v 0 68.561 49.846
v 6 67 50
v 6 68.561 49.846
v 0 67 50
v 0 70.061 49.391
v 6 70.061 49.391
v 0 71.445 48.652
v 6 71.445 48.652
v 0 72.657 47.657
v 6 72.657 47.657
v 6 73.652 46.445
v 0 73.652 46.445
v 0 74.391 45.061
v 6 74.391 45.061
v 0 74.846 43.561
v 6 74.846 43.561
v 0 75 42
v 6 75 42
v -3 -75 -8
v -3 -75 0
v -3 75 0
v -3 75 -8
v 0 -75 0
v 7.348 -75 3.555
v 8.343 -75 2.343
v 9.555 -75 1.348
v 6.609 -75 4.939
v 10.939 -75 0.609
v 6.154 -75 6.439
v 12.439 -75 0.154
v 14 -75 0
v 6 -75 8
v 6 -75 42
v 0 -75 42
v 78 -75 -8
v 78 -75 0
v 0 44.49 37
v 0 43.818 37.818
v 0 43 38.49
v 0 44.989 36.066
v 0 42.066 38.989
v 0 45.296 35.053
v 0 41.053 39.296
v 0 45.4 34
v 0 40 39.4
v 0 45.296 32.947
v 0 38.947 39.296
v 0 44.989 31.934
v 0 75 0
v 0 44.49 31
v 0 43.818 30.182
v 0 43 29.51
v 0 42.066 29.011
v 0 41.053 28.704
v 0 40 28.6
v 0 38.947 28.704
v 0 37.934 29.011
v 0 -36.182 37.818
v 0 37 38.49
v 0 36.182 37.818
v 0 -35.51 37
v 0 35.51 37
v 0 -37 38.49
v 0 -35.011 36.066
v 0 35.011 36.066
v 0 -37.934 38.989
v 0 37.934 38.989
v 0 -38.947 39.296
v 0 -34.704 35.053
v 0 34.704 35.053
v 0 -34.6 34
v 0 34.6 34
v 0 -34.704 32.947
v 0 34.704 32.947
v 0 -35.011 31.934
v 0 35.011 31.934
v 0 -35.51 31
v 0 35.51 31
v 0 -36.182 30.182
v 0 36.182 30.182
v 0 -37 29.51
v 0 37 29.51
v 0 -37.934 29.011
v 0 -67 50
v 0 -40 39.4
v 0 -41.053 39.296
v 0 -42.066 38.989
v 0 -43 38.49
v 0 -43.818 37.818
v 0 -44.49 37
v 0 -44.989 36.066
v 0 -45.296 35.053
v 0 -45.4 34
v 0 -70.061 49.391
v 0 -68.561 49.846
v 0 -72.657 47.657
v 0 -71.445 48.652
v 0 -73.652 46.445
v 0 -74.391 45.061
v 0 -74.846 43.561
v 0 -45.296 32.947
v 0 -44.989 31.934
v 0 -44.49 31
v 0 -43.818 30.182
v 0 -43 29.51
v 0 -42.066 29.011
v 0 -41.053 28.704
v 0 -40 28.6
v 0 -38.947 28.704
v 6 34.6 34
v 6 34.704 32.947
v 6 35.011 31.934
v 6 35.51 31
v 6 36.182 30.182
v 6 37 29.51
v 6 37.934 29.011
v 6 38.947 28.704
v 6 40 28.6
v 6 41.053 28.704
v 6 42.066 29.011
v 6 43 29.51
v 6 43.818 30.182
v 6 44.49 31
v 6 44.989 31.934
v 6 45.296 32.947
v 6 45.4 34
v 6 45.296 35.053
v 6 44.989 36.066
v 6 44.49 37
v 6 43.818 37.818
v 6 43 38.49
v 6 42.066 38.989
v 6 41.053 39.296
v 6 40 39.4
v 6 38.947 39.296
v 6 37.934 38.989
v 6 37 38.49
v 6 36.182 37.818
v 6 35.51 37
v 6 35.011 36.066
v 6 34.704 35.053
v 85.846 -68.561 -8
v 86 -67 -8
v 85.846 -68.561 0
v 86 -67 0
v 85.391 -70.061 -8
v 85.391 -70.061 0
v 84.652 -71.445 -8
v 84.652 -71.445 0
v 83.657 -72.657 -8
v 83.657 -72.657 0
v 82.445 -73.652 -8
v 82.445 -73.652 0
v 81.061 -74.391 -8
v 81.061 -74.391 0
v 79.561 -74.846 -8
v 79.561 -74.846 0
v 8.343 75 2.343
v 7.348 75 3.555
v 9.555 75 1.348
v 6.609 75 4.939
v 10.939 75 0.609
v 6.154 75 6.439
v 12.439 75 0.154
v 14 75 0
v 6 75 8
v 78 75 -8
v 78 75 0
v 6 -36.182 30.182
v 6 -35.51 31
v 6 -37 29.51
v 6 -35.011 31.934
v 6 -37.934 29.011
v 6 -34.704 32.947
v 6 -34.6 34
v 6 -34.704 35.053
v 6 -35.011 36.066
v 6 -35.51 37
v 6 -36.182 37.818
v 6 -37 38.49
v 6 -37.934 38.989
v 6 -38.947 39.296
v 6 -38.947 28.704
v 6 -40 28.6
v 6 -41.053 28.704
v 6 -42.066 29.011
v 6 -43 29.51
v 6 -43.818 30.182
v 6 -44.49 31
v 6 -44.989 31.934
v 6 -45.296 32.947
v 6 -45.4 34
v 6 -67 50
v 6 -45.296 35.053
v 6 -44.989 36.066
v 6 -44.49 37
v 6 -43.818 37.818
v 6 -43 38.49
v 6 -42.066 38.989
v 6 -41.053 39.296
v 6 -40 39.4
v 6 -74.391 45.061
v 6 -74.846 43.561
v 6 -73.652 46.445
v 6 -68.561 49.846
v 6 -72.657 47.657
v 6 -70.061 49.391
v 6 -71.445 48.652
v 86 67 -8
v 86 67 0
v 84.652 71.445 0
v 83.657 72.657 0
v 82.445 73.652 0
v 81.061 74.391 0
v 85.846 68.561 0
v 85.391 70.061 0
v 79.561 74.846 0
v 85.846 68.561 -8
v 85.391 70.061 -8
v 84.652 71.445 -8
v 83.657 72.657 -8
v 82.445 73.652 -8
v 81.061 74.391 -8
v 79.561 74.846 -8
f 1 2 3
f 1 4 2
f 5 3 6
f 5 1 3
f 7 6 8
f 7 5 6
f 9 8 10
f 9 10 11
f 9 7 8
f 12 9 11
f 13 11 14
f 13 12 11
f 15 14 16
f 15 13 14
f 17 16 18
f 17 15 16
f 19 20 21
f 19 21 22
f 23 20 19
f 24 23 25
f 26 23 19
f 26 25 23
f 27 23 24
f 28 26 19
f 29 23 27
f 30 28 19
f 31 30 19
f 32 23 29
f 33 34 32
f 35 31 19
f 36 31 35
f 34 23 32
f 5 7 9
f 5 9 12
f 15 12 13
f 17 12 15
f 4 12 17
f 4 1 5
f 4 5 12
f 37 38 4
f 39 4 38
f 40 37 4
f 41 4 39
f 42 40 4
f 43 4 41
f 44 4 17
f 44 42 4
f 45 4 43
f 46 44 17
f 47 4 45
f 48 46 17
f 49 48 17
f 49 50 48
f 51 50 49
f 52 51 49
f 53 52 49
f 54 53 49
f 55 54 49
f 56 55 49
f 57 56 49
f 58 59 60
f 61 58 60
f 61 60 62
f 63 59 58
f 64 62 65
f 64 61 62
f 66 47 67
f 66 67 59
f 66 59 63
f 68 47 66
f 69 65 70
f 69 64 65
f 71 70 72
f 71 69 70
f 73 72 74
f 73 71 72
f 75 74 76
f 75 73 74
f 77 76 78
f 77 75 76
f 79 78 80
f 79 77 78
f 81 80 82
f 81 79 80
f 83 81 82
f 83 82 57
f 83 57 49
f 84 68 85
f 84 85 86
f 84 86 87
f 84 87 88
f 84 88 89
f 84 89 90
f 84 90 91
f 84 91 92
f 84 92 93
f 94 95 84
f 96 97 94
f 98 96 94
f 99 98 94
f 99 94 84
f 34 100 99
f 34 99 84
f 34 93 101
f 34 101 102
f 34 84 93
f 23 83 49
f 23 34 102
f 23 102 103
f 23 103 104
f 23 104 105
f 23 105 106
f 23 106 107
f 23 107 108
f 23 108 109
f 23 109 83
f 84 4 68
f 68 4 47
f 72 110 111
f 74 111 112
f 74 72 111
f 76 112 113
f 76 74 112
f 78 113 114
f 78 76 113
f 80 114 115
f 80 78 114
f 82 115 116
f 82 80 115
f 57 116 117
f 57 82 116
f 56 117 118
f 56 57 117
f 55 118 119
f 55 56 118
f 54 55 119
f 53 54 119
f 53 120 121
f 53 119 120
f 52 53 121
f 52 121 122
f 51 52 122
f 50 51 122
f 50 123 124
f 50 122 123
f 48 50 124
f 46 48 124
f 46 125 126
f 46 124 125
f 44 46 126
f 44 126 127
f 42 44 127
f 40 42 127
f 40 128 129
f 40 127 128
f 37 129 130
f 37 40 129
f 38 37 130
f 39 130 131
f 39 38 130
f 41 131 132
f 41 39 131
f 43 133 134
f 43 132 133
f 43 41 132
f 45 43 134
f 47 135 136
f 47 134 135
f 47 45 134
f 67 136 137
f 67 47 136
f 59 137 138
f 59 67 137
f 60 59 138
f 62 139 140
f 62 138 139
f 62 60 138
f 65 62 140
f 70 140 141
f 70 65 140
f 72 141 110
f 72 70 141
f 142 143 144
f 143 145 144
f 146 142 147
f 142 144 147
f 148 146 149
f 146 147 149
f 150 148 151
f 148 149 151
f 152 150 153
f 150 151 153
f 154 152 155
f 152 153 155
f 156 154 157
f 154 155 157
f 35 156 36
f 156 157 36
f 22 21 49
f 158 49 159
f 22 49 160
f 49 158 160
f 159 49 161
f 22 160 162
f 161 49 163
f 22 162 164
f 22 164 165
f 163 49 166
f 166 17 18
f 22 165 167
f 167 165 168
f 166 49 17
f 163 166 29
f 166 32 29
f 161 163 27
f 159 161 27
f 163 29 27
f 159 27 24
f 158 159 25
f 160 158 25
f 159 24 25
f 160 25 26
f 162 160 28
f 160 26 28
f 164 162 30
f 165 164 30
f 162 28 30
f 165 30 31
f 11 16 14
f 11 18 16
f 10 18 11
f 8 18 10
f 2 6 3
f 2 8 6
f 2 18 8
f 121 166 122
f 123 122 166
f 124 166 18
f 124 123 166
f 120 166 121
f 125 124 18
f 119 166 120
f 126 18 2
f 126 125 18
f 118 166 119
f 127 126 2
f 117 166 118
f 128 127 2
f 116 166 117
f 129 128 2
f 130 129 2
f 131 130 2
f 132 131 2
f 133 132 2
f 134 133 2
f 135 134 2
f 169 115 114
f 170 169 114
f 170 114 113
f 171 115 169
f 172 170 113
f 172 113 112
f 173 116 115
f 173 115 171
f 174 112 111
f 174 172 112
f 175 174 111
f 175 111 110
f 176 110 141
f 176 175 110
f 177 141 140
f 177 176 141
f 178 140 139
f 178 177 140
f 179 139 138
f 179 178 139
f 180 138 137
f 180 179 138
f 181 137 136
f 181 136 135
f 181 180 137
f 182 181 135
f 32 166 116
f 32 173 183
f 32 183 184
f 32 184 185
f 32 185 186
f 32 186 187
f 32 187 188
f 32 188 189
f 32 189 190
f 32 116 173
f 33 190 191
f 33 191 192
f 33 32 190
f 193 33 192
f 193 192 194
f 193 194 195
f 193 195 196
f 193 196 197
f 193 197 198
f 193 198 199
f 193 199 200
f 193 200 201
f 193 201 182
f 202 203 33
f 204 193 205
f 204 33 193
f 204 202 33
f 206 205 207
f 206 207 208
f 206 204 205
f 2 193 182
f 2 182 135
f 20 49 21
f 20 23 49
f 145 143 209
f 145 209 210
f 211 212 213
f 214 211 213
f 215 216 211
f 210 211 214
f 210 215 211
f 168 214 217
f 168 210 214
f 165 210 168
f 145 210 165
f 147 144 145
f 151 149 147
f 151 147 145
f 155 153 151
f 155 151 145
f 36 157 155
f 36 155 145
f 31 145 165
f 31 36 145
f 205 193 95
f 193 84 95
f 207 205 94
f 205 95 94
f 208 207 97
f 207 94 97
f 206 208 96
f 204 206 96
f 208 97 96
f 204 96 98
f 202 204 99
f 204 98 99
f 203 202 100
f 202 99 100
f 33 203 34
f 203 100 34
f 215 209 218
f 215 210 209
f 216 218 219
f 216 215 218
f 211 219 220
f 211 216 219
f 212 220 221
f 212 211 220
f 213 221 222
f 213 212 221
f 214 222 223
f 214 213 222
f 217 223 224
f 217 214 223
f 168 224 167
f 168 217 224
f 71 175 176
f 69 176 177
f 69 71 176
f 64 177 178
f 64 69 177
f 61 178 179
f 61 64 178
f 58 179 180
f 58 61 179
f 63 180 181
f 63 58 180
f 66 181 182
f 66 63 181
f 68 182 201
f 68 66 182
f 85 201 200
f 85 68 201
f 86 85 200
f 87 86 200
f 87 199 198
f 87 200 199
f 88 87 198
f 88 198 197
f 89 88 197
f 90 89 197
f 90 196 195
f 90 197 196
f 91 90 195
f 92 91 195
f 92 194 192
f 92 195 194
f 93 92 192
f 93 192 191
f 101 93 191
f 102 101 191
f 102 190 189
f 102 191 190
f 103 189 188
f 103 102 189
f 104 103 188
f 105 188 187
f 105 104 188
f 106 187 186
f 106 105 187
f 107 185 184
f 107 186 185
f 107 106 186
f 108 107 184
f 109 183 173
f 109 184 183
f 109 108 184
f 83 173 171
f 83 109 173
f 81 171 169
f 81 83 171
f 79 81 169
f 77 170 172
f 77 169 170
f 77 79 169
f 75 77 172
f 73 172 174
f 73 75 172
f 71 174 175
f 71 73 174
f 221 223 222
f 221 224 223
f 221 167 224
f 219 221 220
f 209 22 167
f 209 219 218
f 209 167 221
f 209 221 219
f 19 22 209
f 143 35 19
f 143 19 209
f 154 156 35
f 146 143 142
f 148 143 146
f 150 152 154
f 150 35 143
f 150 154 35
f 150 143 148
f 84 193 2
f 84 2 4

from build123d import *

# Parameters (mm, degrees)
F1_DEPTH = 75
F2_R     = 8
F3_R     = 5.4
F4_DEPTH = 25


with BuildPart() as f1:
    # F0 (on Front) → F1 (new body, symmetric)
    with BuildSketch(Plane.XZ):
        Polygon((0, 0), (-3, 0), (-3, -8), (86, -8), (86, 0), (6, 0), (6, 50), (0, 50), align=None)
    extrude(amount=F1_DEPTH, both=True)

    # F2
    f2_edges = [f1.edges().sort_by_distance(p)[0] for p in [
        (86, 75, -4),
        (86, -75, -4),
        (3, 75, 50),
        (3, -75, 50),
        (6, 0, 0),
    ]]
    fillet(f2_edges, radius=F2_R)

    # F3 (on Right) → F4 (cut)
    with BuildSketch(Plane.YZ):
        with Locations((-40, 34)):
            Circle(F3_R)
        with BuildLine():
            ThreePointArc((45.4, 34), (40, 39.4), (34.6, 34))
            ThreePointArc((34.6, 34), (40, 28.6), (45.4, 34))
        make_face()
    extrude(amount=F4_DEPTH, mode=Mode.SUBTRACT)


solid = f1.part
